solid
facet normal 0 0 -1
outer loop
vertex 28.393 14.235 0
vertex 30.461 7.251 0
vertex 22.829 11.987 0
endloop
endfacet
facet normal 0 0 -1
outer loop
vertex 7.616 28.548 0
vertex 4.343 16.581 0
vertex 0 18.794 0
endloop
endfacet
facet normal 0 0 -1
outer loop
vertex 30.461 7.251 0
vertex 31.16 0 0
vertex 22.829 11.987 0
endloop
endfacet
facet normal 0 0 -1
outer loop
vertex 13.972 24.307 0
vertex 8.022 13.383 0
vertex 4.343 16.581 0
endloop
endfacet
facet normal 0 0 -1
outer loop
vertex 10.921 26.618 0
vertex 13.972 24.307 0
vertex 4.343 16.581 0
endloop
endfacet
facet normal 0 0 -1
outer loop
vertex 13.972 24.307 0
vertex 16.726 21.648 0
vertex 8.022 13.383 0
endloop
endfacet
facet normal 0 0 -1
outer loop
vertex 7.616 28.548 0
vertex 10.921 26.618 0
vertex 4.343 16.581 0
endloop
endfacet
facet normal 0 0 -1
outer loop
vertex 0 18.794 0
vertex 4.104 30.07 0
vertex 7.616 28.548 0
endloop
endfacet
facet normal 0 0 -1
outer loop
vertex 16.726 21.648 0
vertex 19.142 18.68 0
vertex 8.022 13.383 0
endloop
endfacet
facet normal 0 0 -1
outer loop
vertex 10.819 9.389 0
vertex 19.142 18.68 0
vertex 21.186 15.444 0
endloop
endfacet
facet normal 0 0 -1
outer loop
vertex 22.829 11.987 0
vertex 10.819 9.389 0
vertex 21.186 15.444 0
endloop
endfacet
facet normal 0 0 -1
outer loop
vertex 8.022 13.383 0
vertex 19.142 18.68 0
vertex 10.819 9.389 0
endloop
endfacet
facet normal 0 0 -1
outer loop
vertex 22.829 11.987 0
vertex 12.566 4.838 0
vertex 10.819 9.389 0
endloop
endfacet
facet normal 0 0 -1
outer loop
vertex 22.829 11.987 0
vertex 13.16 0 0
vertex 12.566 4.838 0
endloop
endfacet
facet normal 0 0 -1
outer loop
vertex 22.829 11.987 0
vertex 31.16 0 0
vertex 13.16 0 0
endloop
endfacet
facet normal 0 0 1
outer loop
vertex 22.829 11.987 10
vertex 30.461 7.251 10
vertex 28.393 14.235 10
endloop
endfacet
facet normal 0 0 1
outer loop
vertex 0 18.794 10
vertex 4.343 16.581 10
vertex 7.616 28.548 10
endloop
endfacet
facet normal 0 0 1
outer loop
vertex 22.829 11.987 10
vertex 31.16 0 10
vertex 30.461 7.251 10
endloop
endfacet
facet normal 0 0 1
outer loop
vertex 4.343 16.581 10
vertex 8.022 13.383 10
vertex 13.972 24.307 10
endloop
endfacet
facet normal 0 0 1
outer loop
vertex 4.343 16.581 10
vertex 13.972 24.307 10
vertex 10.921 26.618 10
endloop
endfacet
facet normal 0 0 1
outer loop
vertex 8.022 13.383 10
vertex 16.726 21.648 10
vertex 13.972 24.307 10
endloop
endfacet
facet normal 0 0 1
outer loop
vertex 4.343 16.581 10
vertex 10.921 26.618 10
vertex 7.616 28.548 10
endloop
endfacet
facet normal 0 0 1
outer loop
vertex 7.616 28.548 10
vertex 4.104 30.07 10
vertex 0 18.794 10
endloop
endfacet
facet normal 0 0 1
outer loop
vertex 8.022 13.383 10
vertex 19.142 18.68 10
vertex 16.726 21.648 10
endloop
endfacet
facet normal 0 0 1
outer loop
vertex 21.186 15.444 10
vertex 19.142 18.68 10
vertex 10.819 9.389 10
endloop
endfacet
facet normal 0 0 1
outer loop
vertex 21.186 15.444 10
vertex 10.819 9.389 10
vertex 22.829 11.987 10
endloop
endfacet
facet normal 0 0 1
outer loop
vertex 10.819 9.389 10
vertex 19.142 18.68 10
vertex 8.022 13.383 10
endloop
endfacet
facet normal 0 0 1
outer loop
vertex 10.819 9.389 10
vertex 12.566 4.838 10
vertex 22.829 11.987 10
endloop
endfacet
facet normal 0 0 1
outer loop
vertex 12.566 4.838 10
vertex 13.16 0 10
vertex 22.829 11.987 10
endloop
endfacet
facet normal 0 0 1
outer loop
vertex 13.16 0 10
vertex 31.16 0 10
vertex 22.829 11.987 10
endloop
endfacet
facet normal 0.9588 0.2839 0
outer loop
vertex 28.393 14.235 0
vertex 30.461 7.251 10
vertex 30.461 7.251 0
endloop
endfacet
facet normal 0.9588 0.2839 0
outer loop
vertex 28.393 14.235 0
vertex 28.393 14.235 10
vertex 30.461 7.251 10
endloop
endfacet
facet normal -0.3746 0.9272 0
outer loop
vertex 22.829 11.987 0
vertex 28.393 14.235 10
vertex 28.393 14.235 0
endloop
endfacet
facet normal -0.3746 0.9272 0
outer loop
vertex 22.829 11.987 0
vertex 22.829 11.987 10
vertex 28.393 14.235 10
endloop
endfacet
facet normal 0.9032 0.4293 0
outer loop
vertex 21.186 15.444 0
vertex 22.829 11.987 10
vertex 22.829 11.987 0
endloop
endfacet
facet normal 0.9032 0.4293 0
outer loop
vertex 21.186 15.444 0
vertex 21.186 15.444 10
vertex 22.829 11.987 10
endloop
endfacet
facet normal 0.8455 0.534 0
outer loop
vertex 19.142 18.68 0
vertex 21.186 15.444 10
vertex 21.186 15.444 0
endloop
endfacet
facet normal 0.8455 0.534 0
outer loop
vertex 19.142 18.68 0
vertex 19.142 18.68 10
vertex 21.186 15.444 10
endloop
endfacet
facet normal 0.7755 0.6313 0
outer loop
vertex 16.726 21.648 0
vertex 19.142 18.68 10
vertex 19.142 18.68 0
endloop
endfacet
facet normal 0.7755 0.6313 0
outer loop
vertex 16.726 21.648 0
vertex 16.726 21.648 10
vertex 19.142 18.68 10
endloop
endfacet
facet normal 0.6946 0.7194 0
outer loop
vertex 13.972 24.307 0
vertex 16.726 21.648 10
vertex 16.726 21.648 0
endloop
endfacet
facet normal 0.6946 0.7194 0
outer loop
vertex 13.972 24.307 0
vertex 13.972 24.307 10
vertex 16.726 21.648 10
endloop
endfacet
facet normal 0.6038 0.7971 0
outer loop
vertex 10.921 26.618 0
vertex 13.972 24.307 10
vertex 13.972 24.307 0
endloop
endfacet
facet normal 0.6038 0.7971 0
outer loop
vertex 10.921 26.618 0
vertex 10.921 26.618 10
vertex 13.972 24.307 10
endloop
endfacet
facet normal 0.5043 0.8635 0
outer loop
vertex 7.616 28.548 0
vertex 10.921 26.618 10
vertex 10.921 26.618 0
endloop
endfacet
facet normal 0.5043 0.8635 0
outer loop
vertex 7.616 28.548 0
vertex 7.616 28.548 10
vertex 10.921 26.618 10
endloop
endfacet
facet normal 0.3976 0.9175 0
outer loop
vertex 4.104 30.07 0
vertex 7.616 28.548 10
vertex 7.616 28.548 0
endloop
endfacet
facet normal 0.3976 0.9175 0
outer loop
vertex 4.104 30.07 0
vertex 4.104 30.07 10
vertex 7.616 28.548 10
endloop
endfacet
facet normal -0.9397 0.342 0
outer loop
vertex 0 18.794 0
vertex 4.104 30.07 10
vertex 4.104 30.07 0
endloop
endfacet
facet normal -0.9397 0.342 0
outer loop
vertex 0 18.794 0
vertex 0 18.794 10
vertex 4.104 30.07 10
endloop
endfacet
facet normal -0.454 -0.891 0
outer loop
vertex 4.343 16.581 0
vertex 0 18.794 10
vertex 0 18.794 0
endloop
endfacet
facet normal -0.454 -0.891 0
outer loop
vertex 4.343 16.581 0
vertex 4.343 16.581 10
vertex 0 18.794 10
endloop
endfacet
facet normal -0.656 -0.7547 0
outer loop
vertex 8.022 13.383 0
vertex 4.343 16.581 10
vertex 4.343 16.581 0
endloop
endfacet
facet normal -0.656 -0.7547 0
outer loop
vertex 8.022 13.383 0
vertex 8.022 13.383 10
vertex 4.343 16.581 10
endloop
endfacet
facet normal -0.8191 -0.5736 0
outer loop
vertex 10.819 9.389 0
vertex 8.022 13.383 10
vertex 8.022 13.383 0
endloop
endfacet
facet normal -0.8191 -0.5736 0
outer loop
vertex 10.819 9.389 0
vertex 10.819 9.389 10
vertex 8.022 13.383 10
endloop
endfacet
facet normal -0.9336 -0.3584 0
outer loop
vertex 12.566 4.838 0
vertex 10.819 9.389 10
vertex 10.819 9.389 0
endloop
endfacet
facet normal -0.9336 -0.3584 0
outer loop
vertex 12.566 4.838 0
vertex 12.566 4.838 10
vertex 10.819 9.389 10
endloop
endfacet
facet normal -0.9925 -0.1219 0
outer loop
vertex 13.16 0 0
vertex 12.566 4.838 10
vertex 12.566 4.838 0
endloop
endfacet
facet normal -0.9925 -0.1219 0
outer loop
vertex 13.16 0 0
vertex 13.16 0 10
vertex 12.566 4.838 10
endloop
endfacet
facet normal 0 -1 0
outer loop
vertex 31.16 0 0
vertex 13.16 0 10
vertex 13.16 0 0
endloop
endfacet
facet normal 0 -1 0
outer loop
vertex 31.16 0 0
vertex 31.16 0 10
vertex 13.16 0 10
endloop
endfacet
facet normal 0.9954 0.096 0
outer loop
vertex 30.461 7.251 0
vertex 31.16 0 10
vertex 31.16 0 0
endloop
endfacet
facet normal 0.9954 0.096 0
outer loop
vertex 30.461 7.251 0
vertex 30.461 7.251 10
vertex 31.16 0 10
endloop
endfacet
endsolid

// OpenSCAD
$fn = 32;

// ----------------------------------------------------------------------
// Arc stop: segment, 10 mm thick
// ----------------------------------------------------------------------

// --- parameters (mm) ---
profile_height = 10;      // extrusion height
profile_points = 17;      // points of the closed outline

profile = [[31.16, 0], [30.461, 7.251], [28.393, 14.235], [22.829, 11.987], [21.186, 15.444], [19.142, 18.68], [16.726, 21.648], [13.972, 24.307], [10.921, 26.618], [7.616, 28.548], [4.104, 30.07], [0, 18.794], [4.343, 16.581], [8.022, 13.383], [10.819, 9.389], [12.566, 4.838], [13.16, 0]];  // single closed polygon, 17 points, counter clockwise

// --- the one profile operation ---
linear_extrude(height = profile_height) polygon(points = profile);
